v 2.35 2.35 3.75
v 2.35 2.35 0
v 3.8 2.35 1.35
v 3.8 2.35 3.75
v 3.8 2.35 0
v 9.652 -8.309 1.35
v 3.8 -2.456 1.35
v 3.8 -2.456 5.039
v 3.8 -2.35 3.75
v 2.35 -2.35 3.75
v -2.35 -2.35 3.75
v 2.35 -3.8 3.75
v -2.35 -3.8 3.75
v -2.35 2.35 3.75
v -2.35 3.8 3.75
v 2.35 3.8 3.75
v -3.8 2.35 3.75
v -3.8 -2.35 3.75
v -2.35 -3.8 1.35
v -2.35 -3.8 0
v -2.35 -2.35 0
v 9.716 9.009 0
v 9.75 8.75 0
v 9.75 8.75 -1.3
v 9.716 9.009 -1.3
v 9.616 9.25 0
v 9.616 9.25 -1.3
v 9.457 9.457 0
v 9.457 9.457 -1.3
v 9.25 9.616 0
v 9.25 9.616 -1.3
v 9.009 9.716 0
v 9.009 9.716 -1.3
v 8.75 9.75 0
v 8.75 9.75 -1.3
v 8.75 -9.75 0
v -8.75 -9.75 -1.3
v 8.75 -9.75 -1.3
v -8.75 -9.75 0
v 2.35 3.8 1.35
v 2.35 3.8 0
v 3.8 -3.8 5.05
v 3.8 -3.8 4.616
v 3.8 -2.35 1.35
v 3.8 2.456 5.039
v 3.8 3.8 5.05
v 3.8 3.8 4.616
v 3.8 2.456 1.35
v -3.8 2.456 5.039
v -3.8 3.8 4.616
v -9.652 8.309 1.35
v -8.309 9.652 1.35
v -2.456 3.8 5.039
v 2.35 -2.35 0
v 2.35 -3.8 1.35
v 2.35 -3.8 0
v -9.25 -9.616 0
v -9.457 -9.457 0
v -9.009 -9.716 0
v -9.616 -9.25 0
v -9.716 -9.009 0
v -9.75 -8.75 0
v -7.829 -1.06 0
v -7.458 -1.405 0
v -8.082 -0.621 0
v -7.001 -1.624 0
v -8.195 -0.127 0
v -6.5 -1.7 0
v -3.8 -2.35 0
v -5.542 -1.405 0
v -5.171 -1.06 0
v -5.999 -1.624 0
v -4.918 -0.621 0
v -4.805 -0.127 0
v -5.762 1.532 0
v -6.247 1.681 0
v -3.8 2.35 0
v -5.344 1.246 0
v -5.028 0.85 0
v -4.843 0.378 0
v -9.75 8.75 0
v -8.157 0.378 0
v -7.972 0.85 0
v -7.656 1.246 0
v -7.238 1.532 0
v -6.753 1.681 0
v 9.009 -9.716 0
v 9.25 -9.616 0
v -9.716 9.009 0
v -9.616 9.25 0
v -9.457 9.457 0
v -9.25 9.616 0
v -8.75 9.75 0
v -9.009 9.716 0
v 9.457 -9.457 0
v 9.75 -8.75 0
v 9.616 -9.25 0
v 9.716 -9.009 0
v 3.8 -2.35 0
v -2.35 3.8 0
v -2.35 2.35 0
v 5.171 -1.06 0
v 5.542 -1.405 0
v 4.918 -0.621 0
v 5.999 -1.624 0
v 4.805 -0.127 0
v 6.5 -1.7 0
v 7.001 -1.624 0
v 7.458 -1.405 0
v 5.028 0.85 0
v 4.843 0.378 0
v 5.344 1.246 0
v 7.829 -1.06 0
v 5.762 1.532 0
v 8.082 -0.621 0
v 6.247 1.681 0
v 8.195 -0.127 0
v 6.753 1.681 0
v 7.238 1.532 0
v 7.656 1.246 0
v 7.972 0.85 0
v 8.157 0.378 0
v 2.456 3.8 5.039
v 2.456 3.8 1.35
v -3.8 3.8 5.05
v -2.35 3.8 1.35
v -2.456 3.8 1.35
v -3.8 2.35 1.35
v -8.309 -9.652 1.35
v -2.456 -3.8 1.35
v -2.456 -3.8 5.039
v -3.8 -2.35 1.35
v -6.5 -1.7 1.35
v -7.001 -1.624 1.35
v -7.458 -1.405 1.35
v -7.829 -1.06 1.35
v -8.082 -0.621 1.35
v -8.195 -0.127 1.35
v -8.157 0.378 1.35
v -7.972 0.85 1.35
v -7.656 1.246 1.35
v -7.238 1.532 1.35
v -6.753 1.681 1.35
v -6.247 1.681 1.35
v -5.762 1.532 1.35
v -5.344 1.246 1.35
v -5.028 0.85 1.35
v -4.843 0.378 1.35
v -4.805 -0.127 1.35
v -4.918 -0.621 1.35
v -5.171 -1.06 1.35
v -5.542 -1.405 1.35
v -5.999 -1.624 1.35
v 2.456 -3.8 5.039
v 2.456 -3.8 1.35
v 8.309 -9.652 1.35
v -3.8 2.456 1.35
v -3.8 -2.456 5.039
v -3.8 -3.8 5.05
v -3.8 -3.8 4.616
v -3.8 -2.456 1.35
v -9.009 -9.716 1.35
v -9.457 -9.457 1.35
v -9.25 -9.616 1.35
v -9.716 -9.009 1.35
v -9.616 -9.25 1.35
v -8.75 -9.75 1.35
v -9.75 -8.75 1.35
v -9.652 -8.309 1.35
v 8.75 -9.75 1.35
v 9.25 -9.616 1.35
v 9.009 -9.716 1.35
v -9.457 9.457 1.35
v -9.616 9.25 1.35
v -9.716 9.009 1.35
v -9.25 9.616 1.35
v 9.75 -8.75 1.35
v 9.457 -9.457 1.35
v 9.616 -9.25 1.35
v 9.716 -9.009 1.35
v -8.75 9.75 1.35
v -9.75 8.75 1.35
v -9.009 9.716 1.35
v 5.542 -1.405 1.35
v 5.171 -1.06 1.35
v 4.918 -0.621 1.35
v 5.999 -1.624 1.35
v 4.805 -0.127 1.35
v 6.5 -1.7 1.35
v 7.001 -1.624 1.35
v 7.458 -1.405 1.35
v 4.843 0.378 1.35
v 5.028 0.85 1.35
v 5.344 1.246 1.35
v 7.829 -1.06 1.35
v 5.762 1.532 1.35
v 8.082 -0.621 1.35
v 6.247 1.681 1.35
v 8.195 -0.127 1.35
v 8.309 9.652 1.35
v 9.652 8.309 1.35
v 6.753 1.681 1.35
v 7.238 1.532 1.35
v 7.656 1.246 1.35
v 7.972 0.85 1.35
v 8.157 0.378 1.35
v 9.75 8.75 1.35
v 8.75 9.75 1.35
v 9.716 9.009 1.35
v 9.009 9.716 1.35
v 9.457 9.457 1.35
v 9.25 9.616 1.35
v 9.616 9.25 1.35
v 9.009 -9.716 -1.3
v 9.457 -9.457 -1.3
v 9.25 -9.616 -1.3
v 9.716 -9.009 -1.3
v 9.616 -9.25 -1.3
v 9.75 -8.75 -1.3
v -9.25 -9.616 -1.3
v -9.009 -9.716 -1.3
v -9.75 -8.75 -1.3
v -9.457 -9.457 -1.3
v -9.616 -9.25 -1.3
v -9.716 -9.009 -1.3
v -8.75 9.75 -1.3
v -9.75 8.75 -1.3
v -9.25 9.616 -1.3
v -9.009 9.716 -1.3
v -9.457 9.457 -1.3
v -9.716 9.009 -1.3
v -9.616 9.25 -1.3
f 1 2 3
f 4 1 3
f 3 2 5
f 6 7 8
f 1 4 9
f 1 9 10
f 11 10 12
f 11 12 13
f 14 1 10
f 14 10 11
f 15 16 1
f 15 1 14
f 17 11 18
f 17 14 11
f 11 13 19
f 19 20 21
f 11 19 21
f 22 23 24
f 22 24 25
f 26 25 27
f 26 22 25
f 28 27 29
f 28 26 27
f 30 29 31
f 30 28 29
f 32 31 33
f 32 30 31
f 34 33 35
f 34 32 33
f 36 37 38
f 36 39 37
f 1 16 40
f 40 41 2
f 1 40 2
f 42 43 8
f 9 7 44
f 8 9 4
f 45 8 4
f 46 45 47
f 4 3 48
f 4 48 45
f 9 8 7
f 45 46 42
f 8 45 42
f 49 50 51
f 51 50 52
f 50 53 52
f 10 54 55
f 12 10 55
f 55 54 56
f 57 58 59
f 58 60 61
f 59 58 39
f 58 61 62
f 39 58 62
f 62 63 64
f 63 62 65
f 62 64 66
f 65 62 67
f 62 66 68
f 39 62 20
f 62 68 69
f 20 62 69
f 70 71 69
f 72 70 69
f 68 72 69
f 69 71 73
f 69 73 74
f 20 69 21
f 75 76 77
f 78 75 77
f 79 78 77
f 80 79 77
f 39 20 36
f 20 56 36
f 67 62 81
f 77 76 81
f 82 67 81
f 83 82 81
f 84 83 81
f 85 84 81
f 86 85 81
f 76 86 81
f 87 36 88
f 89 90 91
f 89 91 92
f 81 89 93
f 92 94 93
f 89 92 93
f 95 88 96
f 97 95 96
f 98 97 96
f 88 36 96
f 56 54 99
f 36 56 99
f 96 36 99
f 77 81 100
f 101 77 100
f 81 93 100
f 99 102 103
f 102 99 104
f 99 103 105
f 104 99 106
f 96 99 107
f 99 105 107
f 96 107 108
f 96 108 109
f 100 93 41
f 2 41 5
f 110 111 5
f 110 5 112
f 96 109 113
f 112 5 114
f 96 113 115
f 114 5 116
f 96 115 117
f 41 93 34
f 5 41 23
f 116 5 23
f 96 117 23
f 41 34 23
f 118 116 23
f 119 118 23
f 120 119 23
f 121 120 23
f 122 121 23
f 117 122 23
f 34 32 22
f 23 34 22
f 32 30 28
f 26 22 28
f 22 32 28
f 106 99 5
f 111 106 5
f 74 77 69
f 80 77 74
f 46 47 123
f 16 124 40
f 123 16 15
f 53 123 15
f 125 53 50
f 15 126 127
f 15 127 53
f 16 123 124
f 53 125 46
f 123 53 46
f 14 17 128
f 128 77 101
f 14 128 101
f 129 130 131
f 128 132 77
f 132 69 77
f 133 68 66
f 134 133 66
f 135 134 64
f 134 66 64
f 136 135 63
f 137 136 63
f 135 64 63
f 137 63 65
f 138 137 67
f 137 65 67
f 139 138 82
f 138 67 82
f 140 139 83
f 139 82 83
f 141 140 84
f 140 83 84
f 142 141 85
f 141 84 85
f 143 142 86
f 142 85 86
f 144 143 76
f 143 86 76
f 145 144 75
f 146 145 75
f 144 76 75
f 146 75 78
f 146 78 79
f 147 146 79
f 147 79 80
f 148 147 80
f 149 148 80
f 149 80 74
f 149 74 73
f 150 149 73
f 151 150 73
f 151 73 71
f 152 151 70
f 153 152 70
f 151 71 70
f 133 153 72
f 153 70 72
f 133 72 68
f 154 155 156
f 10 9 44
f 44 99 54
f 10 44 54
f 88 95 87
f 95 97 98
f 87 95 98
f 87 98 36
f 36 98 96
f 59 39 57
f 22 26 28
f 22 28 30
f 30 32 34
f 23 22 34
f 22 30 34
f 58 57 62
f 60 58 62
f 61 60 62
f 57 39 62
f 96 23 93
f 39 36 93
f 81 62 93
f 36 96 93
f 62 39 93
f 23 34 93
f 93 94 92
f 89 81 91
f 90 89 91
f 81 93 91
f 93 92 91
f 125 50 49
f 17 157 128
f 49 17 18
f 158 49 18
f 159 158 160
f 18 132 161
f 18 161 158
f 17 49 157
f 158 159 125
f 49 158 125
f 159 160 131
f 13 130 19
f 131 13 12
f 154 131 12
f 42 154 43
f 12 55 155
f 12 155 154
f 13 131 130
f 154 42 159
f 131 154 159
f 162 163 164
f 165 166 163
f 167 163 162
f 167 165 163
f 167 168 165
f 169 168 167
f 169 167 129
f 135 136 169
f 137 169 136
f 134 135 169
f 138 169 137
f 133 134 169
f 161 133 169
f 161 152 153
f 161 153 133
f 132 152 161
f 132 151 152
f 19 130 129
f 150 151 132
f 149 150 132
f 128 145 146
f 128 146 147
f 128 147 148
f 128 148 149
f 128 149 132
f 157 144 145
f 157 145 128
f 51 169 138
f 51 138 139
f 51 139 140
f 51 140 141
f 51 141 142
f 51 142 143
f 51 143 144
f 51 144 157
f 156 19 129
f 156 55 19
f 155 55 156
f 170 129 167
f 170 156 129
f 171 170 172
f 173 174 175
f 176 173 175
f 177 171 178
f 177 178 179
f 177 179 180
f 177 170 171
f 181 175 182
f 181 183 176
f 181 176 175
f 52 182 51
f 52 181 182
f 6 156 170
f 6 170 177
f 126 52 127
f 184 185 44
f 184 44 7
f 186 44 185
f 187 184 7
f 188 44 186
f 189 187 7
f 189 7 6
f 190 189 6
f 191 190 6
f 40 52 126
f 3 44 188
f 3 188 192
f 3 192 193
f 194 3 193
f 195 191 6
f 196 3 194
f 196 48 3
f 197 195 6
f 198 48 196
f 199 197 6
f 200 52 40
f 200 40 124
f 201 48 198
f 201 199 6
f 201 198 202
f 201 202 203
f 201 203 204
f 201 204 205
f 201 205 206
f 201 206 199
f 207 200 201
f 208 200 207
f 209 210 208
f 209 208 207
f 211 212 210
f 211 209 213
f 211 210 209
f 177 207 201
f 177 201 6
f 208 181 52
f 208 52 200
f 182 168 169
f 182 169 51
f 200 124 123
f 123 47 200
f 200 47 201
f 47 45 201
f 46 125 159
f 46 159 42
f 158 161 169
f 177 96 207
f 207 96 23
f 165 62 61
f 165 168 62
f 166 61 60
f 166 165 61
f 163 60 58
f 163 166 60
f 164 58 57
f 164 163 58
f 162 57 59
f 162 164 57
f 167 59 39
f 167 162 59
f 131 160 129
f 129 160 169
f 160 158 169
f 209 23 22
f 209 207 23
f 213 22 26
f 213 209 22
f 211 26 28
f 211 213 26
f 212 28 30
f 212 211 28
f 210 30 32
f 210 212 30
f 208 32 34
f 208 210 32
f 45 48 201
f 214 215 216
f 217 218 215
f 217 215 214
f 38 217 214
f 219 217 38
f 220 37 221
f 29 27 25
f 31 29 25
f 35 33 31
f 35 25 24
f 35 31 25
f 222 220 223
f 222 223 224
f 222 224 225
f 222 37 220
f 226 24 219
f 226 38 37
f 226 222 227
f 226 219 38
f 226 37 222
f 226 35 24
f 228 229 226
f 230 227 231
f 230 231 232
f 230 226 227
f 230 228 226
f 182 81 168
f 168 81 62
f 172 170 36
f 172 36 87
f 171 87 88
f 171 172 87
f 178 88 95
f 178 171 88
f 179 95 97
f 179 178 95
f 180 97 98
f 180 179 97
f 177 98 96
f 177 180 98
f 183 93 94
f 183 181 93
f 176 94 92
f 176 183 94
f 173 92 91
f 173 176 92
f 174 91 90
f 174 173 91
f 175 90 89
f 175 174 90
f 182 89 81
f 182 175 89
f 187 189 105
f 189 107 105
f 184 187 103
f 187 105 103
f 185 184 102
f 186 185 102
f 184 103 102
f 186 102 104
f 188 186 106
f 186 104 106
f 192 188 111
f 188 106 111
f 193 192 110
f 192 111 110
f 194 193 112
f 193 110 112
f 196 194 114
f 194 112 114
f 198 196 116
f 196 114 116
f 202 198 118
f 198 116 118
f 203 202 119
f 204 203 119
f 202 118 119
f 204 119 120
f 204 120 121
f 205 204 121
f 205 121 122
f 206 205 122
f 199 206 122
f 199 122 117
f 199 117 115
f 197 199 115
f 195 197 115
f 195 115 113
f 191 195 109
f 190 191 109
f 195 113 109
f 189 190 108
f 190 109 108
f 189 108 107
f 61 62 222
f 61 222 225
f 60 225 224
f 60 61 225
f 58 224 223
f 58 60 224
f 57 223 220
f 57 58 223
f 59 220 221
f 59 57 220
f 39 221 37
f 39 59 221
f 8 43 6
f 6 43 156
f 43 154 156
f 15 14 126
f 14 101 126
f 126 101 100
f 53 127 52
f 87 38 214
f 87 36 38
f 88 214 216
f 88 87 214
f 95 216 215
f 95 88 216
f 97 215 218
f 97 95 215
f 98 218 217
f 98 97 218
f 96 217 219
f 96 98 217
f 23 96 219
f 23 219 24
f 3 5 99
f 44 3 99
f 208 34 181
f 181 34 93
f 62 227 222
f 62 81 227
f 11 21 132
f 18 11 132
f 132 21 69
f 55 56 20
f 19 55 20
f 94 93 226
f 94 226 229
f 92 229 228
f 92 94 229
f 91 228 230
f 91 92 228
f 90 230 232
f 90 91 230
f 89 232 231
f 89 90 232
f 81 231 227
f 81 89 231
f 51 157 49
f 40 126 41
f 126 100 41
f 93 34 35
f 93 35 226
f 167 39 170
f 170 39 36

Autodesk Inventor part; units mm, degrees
ref_plane "YZ Plane" through (0, 0, 0) normal (1, 0, 0) x (0, 1, 0)
sketch "Sketch1" plane through (0, 0, 0) normal (0, 0, 1) x (1, 0, 0)
  line L0 (-9.75, -9.75) -> (9.75, -9.75)
  line L1 (9.75, -9.75) -> (9.75, 9.75)
  line L2 (9.75, 9.75) -> (-9.75, 9.75)
  line L3 (-9.75, 9.75) -> (-9.75, -9.75)
  line L4 (-9.75, -9.75) -> (9.75, 9.75) construction
  line L5 (9.75, -9.75) -> (-9.75, 9.75) construction
  point P0 (0, 0)
  dimension "d0" = 19.5
  dimension "d1" = 19.5
extrude "Extrusion1" add sketch "Sketch1" along normal blind 1.35
sketch "Sketch2" plane through (0, 0, 1.35) normal (0, 0, 1) x (1, 0, 0)
  line L0 (-3.8, -3.8) -> (3.8, -3.8)
  line L1 (3.8, -3.8) -> (3.8, 3.8)
  line L2 (3.8, 3.8) -> (-3.8, 3.8)
  line L3 (-3.8, 3.8) -> (-3.8, -3.8)
  line L4 (-3.8, -3.8) -> (3.8, 3.8) construction
  line L5 (3.8, -3.8) -> (-3.8, 3.8) construction
  point P0 (0, 0)
  dimension "d4" = 7.6
  dimension "d5" = 7.6
extrude "Extrusion2" add sketch "Sketch2" along normal blind 3.7
fillet "Fillet1" radius 1 4 edges at (9.75, -9.75, 0.675) (9.75, 9.75, 0.675) (-9.75, -9.75, 0.675) (-9.75, 9.75, 0.675)
ref_plane "Work Plane1" through (0, 0, 0) normal (-0.7071, 0.7071, 0) x (0, 0, 1)
sketch "Sketch3" plane through (0, 0, 0) normal (-0.7071, 0.7071, 0) x (0, 0, 1)
  line L0 (5.05, 4.4) -> (1.35, 12.7)
  line L1 (1.35, 12.7) -> (1.35, 4.4)
  line L2 (1.35, 4.4) -> (5.05, 4.4)
  line L3 (1.35, 13.0815) -> (1.35, 0.7071) projected
  line L4 (5.05, 5.374) -> (5.05, 0) projected
  point P0 (0, 0)
  dimension "d10" = 4.4
  dimension "d11" = 12.7
extrude "Extrusion3" add sketch "Sketch3" along normal mid plane 1.9
pattern_circular "Circular Pattern1" count 4 over 360 about axis through (0, 0, -10) along (0, 0, 1) of "Extrusion3"
sketch "Sketch4" plane through (0, 0, 0) normal (0, 0, -1) x (-1, 0, 0)
  line L0 (2.35, 3.8) -> (-2.35, 3.8)
  line L1 (-2.35, 3.8) -> (-2.35, -3.8)
  line L2 (-2.35, -3.8) -> (2.35, -3.8)
  line L3 (2.35, -3.8) -> (2.35, 3.8)
  line L4 (2.35, 3.8) -> (-2.35, -3.8) construction
  line L5 (-2.35, 3.8) -> (2.35, -3.8) construction
  line L6 (3.8, 2.35) -> (-3.8, 2.35)
  line L7 (-3.8, 2.35) -> (-3.8, -2.35)
  line L8 (-3.8, -2.35) -> (3.8, -2.35)
  line L9 (3.8, -2.35) -> (3.8, 2.35)
  line L10 (3.8, 2.35) -> (-3.8, -2.35) construction
  line L11 (-3.8, 2.35) -> (3.8, -2.35) construction
  line L12 (3.8, -3.8) -> (-3.8, -3.8) projected
  line L13 (-3.8, -3.8) -> (-3.8, 3.8) projected
  point P0 (0, 0)
  dimension "d17" = 4.7
  dimension "d18" = 4.7
extrude "Extrusion4" cut sketch "Sketch4" against normal blind 3.75 contours L3 L6 L1 L0 | L6 L9 L8 L3 | L3 L8 L1 L6 | L1 L8 L7 L6 | L3 L2 L1 L8
sketch "Sketch5" plane through (0, 0, 1.35) normal (0, 0, 1) x (1, 0, 0)
  point P0 (0, 0)
  point P1 (-6.5, 0)
  point P2 (6.5, 0)
  dimension "d22" = 13
  dimension "d23" = 6.5
hole "Hole1" at (-6.5, 0, 1.35) at (6.5, 0, 1.35) direction (0, 0, -1) diameter 3.4 end through all
sketch "Sketch6" plane through (0, 0, 0) normal (0, 0, -1) x (-1, 0, 0)
  line L0 (-8.75, 9.75) -> (8.75, 9.75) projected
  line L1 (-9.75, -8.75) -> (-9.75, 8.75) projected
  line L2 (8.75, -9.75) -> (-8.75, -9.75) projected
  line L3 (9.75, 8.75) -> (9.75, -8.75) projected
  arc A0 (8.75, -9.75) -> (9.75, -8.75) centre (8.75, -8.75) ccw projected
  arc A1 (-9.75, -8.75) -> (-8.75, -9.75) centre (-8.75, -8.75) ccw projected
  arc A2 (-8.75, 9.75) -> (-9.75, 8.75) centre (-8.75, 8.75) ccw projected
  arc A3 (9.75, 8.75) -> (8.75, 9.75) centre (8.75, 8.75) ccw projected
extrude "Extrusion5" add sketch "Sketch6" along normal blind 1.3 separate body
ref_plane "Work Plane2" through (0, 0, 10.05) normal (0, 0, 1) x (1, 0, 0)
sketch "Sketch7" plane through (0, 0, 10.05) normal (0, 0, 1) x (1, 0, 0)
  point P0 (0, 0)
  point P1 (0, -2.5)
  point P2 (0, 2.5)
  dimension "d34" = 5
  dimension "d35" = 2.5
equation "\"d1\" = d0"
equation "\"d5\" = d4"
equation "\"d18\" = d17"
equation "\"d23\" = 0.5 * d22"
equation "\"d35\" = 0.5 * d34"
properties part number "Klebesockel_HC-101SBK"
